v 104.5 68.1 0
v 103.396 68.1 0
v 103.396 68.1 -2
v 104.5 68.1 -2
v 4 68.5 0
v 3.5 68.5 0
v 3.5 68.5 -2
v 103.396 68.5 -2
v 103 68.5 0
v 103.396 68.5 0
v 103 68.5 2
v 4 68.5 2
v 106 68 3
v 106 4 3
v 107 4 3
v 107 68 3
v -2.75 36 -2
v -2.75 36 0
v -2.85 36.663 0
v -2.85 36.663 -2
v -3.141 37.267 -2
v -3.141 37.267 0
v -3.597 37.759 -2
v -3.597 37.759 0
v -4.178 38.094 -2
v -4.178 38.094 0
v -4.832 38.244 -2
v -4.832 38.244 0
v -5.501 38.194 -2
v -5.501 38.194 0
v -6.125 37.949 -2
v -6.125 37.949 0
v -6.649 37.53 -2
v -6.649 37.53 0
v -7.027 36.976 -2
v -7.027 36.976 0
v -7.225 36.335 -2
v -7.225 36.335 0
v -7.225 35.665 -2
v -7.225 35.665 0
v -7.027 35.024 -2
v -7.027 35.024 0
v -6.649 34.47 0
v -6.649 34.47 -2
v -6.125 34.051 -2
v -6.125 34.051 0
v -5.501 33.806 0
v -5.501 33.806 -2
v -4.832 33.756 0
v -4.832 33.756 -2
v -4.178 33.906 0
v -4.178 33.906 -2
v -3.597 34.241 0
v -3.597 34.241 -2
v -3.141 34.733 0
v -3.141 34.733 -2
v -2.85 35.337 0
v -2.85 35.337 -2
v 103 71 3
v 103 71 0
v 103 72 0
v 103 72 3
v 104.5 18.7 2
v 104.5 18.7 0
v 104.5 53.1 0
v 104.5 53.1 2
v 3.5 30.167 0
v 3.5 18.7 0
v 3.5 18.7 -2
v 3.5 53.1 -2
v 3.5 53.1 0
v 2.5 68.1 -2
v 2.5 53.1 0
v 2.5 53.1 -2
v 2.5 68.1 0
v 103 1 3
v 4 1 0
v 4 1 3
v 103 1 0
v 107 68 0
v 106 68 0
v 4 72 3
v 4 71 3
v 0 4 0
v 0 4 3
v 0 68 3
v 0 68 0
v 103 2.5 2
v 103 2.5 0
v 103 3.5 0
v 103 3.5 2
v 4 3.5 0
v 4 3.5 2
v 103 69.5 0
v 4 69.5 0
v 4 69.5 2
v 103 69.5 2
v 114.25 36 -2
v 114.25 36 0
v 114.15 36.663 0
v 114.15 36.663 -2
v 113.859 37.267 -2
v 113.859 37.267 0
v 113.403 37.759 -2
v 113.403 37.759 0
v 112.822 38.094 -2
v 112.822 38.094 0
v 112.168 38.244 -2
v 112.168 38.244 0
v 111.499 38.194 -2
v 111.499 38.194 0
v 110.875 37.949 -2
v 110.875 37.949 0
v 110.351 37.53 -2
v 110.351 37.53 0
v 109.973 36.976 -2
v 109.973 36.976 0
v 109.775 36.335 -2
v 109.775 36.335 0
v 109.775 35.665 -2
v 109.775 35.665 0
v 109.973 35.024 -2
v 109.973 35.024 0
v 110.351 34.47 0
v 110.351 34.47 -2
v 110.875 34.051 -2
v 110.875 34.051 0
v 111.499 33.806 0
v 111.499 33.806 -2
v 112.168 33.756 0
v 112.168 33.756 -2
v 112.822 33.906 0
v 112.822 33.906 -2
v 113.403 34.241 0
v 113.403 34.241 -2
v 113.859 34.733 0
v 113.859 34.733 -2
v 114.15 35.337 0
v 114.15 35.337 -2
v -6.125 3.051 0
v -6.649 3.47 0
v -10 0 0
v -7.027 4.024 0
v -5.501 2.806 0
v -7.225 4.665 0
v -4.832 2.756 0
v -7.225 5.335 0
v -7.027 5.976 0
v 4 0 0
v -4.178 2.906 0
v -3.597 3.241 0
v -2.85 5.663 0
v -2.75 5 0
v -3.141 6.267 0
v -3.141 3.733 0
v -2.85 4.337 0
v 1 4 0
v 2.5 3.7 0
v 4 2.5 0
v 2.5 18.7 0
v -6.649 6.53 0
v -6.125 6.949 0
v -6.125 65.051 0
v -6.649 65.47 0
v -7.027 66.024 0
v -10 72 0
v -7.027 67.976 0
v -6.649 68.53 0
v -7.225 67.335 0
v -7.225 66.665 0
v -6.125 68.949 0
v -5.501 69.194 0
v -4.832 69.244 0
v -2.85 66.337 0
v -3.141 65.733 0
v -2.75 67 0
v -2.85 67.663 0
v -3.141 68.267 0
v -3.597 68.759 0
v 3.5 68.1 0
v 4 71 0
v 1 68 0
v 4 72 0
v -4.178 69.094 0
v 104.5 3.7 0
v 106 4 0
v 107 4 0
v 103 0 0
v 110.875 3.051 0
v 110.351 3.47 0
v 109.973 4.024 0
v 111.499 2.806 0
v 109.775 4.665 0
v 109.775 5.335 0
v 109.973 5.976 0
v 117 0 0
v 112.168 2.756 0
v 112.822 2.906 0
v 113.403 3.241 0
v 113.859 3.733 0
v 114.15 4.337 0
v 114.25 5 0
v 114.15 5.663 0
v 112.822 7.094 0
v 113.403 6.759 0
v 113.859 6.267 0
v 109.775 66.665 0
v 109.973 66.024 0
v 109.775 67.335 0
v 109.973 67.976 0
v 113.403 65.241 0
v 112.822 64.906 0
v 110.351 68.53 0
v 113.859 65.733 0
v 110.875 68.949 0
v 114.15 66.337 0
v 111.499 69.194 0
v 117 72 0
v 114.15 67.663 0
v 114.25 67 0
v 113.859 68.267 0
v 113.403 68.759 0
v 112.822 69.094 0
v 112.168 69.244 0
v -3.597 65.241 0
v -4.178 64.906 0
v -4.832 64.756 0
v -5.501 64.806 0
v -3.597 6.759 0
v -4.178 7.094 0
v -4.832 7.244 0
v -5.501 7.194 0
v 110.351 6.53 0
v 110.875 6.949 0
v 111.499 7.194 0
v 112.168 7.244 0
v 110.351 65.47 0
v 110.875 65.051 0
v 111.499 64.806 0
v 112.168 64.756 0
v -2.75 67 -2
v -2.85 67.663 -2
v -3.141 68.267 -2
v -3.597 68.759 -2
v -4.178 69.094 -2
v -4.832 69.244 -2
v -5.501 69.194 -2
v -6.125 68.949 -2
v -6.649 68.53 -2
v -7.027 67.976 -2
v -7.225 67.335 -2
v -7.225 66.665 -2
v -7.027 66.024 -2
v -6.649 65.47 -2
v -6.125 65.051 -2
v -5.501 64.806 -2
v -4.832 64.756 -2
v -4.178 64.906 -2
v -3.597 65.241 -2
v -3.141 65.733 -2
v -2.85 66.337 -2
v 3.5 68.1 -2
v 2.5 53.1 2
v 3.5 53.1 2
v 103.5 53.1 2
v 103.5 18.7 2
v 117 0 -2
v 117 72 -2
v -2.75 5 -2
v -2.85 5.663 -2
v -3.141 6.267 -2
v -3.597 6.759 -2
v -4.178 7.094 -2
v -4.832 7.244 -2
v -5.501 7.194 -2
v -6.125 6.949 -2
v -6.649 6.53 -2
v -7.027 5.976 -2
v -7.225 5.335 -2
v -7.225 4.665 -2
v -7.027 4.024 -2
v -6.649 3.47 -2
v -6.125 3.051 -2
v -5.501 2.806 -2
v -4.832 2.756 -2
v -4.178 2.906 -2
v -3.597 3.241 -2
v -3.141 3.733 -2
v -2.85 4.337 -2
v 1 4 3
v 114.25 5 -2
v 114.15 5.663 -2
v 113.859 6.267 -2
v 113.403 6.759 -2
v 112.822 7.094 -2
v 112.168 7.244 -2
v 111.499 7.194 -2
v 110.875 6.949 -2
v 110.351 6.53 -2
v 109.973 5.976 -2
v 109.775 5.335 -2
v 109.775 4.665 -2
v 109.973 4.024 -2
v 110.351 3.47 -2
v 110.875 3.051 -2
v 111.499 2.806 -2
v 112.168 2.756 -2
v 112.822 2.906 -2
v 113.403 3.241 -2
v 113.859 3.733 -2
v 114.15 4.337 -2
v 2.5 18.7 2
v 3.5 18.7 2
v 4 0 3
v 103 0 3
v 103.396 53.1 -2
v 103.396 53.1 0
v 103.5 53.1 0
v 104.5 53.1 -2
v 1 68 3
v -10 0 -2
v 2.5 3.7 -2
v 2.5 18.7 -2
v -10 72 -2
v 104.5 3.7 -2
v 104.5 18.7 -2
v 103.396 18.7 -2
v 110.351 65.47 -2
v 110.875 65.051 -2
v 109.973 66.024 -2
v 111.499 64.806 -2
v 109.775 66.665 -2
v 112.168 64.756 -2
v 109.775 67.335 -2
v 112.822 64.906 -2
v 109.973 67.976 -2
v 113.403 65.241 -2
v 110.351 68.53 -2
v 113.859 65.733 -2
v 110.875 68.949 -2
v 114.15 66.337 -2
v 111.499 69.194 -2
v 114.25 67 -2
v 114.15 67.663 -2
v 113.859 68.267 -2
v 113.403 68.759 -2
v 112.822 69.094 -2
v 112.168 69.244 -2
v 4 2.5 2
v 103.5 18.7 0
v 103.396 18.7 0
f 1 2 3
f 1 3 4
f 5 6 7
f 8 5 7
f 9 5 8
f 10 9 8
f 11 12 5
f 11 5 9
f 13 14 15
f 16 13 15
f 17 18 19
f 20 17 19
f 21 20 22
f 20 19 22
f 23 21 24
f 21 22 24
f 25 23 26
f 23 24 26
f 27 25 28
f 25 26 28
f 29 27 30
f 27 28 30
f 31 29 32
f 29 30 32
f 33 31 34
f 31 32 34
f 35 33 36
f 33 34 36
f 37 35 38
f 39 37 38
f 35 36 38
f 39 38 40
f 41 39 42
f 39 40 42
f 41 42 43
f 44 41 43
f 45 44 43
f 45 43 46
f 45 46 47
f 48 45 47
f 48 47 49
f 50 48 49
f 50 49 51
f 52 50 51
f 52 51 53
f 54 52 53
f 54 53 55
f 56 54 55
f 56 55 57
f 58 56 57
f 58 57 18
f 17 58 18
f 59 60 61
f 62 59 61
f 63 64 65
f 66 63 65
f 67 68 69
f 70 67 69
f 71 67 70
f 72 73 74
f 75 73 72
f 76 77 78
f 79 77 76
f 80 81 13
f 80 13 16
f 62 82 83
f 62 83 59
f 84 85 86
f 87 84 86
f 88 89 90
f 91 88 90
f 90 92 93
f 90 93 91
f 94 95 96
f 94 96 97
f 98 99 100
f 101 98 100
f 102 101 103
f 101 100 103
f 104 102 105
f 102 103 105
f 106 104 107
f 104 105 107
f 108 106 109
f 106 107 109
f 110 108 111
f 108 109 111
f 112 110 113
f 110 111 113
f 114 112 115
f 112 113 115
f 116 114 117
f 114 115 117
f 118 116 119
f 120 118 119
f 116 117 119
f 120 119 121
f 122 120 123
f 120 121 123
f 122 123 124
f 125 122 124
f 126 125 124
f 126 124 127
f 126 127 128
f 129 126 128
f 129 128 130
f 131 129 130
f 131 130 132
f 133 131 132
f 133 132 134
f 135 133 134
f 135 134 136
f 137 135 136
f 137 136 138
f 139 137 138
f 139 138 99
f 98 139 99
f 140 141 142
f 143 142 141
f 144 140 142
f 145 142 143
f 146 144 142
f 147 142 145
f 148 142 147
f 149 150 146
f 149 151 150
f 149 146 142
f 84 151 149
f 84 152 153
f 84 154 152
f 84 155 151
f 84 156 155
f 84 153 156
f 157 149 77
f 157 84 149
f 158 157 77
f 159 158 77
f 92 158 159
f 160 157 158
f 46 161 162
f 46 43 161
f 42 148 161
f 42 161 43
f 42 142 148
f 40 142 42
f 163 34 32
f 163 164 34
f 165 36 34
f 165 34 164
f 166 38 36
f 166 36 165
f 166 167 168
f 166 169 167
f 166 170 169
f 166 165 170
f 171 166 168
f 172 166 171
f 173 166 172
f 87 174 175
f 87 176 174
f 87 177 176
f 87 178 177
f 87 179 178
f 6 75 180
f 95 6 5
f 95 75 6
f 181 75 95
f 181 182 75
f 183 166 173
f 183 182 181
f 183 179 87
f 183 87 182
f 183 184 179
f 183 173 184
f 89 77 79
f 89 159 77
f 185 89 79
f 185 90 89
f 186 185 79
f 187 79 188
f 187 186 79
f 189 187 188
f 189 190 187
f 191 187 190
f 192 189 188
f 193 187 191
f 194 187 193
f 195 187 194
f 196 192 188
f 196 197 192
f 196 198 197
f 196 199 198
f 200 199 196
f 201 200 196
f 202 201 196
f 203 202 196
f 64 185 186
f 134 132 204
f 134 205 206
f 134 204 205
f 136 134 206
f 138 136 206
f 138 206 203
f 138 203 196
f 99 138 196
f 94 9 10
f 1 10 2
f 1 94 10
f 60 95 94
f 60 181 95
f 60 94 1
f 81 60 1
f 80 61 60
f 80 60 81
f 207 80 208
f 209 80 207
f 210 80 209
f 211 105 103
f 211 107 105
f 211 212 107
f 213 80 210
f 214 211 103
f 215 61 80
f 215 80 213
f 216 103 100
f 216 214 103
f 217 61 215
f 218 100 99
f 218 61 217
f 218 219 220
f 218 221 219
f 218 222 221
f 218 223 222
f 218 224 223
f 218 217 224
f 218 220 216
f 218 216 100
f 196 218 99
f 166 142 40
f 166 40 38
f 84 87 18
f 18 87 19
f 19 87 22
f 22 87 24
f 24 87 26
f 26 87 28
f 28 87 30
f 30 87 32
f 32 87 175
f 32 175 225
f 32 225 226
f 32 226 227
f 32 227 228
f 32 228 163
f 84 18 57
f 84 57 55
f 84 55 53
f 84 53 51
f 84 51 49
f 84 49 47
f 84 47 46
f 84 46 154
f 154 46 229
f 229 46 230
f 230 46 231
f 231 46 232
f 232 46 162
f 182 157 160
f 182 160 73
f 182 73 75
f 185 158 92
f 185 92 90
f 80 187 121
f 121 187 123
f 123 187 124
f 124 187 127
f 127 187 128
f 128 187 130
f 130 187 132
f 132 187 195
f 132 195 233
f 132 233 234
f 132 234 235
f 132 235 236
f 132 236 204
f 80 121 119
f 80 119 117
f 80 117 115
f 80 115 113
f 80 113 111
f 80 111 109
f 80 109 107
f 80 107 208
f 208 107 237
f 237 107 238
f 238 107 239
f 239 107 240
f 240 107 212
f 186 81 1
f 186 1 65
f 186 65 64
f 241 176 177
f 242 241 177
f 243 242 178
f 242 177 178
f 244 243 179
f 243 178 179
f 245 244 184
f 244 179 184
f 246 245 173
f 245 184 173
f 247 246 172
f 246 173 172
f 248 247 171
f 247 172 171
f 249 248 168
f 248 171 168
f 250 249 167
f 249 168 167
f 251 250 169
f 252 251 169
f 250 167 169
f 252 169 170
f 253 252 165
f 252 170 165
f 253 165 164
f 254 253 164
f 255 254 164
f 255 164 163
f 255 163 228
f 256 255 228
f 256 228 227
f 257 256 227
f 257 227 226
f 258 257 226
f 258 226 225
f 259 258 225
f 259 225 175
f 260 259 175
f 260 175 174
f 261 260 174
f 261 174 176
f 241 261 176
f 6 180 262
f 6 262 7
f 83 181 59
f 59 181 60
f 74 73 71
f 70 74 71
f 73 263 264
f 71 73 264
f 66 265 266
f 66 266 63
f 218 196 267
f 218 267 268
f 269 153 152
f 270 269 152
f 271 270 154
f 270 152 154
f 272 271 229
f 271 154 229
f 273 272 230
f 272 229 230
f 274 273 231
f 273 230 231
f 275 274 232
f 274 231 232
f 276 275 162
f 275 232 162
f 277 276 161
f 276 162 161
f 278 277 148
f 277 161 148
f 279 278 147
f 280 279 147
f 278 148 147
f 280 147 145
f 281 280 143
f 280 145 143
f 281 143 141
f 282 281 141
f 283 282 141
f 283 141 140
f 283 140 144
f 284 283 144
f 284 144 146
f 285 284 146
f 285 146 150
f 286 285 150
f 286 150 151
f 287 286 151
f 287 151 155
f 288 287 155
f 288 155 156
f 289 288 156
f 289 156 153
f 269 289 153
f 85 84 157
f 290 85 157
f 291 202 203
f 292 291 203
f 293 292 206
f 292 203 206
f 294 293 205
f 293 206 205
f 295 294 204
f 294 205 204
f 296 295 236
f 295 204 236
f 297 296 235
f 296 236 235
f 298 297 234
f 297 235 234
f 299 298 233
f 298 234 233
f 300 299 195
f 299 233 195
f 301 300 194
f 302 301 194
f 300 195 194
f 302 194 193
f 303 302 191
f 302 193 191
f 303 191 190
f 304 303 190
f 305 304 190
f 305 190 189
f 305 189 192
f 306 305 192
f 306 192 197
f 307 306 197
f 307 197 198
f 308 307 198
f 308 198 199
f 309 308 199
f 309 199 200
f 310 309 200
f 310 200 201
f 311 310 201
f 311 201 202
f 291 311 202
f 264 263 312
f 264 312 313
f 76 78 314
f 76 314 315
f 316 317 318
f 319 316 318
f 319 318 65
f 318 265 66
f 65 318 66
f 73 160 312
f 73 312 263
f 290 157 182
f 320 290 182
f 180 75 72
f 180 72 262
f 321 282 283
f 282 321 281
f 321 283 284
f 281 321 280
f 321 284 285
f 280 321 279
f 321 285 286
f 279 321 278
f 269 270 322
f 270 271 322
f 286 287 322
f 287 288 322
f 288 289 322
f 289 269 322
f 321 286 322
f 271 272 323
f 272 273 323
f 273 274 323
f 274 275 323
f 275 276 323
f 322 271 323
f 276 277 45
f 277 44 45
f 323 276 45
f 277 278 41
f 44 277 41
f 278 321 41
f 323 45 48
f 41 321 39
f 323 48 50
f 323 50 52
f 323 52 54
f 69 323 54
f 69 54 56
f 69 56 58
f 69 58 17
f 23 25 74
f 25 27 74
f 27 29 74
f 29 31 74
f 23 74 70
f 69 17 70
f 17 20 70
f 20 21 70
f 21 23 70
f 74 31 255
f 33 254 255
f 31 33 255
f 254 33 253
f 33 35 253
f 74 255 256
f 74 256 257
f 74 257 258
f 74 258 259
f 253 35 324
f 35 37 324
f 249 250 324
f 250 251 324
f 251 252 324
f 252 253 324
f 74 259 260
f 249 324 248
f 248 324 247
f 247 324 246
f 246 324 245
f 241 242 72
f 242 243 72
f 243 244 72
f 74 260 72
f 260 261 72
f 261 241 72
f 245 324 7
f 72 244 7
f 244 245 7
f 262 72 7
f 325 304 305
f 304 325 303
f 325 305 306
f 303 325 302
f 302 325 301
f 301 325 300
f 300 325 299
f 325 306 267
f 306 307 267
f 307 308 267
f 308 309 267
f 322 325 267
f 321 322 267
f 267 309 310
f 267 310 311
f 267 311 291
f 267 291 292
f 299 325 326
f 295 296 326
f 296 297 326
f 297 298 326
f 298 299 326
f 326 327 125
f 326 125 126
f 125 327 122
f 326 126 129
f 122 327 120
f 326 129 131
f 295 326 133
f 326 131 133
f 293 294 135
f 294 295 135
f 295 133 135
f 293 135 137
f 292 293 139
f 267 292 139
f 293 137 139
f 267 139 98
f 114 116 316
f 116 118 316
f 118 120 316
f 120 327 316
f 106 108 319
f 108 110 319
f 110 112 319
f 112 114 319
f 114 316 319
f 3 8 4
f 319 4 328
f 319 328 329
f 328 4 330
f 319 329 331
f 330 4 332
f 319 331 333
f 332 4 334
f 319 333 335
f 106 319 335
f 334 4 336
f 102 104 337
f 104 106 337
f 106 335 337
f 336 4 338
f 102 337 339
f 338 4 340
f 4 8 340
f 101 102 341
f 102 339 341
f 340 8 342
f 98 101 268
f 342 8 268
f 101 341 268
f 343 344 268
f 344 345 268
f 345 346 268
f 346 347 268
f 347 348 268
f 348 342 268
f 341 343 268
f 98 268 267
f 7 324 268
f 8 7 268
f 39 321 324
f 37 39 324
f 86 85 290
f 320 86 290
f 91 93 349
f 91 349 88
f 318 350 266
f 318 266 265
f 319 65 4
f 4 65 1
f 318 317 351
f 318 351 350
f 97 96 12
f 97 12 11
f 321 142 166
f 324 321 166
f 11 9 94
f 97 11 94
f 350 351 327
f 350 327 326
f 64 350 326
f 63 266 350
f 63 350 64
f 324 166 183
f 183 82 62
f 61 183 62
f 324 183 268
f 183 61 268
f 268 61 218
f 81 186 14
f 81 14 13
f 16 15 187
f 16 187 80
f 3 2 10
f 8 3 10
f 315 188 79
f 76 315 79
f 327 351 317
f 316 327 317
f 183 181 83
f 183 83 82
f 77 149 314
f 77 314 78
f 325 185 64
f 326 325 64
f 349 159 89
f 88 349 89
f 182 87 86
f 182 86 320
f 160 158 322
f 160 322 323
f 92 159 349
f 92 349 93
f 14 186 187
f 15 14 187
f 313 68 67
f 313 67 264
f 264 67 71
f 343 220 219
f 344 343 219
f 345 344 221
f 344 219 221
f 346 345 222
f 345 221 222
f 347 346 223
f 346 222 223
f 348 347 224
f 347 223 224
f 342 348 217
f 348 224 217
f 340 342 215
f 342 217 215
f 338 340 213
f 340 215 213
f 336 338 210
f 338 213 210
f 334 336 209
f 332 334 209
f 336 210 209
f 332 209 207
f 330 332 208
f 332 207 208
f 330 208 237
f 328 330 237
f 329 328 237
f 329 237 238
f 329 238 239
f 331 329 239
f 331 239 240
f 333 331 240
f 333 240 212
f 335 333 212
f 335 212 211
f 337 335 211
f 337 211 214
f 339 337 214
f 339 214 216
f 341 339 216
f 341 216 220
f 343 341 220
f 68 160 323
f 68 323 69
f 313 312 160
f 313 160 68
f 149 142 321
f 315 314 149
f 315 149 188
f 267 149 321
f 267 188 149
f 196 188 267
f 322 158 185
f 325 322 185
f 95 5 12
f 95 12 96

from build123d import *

# Parameters (mm, degrees)
SKETCH_W             = 107
SKETCH_H             = 72
PAD_DEPTH            = 2
SKETCH001_W          = 1
SKETCH001_H          = 64
PAD001_DEPTH         = 3
SKETCH002_W          = 1
SKETCH002_H          = 64
PAD002_DEPTH         = 2
SKETCH003_W          = 1
SKETCH003_H          = 64
PAD003_DEPTH         = 2
SKETCH004_W          = 1
SKETCH004_H          = 64
PAD004_DEPTH         = 3
SKETCH005_W          = 99
SKETCH005_H          = 1
PAD005_DEPTH         = 3
SKETCH006_W          = 99
SKETCH006_H          = 1
PAD006_DEPTH         = 2
SKETCH007_W          = 99
SKETCH007_H          = 1
PAD007_DEPTH         = 2
SKETCH008_W          = 99
SKETCH008_H          = 1
PAD008_DEPTH         = 3
SKETCH009_W          = 102
SKETCH009_H          = 15
POCKET_DEPTH         = 3.001
POCKET_DEPTH_BACK    = 2.001
SKETCH010_W          = 99.896225
SKETCH010_H          = 50
POCKET001_DEPTH      = 2.001
SKETCH011_W          = 10
SKETCH011_H          = 72
PAD009_DEPTH         = 2
SKETCH012_R          = 2.25
POCKET002_DEPTH      = 2.001
SKETCH014_W          = 10
SKETCH014_H          = 72
PAD010_DEPTH         = 2
SKETCH013_R          = 2.25
POCKET003_DEPTH      = 2.001
SKETCH015_W          = 102
SKETCH015_H          = 15
POCKET004_DEPTH      = 2
POCKET004_DEPTH_BACK = 2


with BuildPart() as part:
    # Sketch → Pad (new body)
    with BuildSketch(Plane.XY):
        with Locations((53.5, 36)):
            Rectangle(SKETCH_W, SKETCH_H)
    extrude(amount=-PAD_DEPTH)

    # Sketch001 → Pad001 (join)
    with BuildSketch(Plane.XY):
        with Locations((0.5, 36)):
            Rectangle(SKETCH001_W, SKETCH001_H)
    extrude(amount=PAD001_DEPTH)

    # Sketch002 → Pad002 (join)
    with BuildSketch(Plane.XY):
        with Locations((3, 36)):
            Rectangle(SKETCH002_W, SKETCH002_H)
    extrude(amount=PAD002_DEPTH)

    # Sketch003 → Pad003 (join)
    with BuildSketch(Plane.XY):
        with Locations((104, 36)):
            Rectangle(SKETCH003_W, SKETCH003_H)
    extrude(amount=PAD003_DEPTH)

    # Sketch004 → Pad004 (join)
    with BuildSketch(Plane.XY):
        with Locations((106.5, 36)):
            Rectangle(SKETCH004_W, SKETCH004_H)
    extrude(amount=PAD004_DEPTH)

    # Sketch005 → Pad005 (join)
    with BuildSketch(Plane.XY):
        with Locations((53.5, 71.5)):
            Rectangle(SKETCH005_W, SKETCH005_H)
    extrude(amount=PAD005_DEPTH)

    # Sketch006 → Pad006 (join)
    with BuildSketch(Plane.XY):
        with Locations((53.5, 69)):
            Rectangle(SKETCH006_W, SKETCH006_H)
    extrude(amount=PAD006_DEPTH)

    # Sketch007 → Pad007 (join)
    with BuildSketch(Plane.XY):
        with Locations((53.5, 3)):
            Rectangle(SKETCH007_W, SKETCH007_H)
    extrude(amount=PAD007_DEPTH)

    # Sketch008 → Pad008 (join)
    with BuildSketch(Plane.XY):
        with Locations((53.5, 0.5)):
            Rectangle(SKETCH008_W, SKETCH008_H)
    extrude(amount=PAD008_DEPTH)

    # Sketch009 → Pocket (cut, two sides)
    with BuildSketch(Plane.XY) as pocket_sk:
        with Locations((53.5, 11.2)):
            Rectangle(SKETCH009_W, SKETCH009_H)
    extrude(amount=POCKET_DEPTH, mode=Mode.SUBTRACT)
    extrude(pocket_sk.sketch, amount=-POCKET_DEPTH_BACK, mode=Mode.SUBTRACT)

    # Sketch010 → Pocket001 (cut, through all)
    with BuildSketch(Plane.XY):
        with Locations((53.448113, 43.5)):
            Rectangle(SKETCH010_W, SKETCH010_H)
    extrude(amount=-POCKET001_DEPTH, mode=Mode.SUBTRACT)

    # Sketch011 → Pad009 (join)
    with BuildSketch(Plane.XY):
        with Locations((-5, 36)):
            Rectangle(SKETCH011_W, SKETCH011_H)
    extrude(amount=-PAD009_DEPTH)

    # Sketch012 → Pocket002 (cut, through all)
    with BuildSketch(Plane.XY):
        with Locations((-5, 5)):
            Circle(SKETCH012_R)
        with Locations((-5, 36)):
            Circle(SKETCH012_R)
        with Locations((-5, 67)):
            Circle(SKETCH012_R)
    extrude(amount=-POCKET002_DEPTH, mode=Mode.SUBTRACT)

    # Sketch014 → Pad010 (join)
    with BuildSketch(Plane.XY):
        with Locations((112, 36)):
            Rectangle(SKETCH014_W, SKETCH014_H)
    extrude(amount=-PAD010_DEPTH)

    # Sketch013 → Pocket003 (cut, through all)
    with BuildSketch(Plane.XY):
        with Locations((112, 5)):
            Circle(SKETCH013_R)
        with Locations((112, 36)):
            Circle(SKETCH013_R)
        with Locations((112, 67)):
            Circle(SKETCH013_R)
    extrude(amount=-POCKET003_DEPTH, mode=Mode.SUBTRACT)

    # Sketch015 → Pocket004 (cut, two sides)
    with BuildSketch(Plane.XY) as pocket004_sk:
        with Locations((53.5, 60.6)):
            Rectangle(SKETCH015_W, SKETCH015_H)
    extrude(amount=POCKET004_DEPTH, mode=Mode.SUBTRACT)
    extrude(pocket004_sk.sketch, amount=-POCKET004_DEPTH_BACK, mode=Mode.SUBTRACT)


solid = part.part
